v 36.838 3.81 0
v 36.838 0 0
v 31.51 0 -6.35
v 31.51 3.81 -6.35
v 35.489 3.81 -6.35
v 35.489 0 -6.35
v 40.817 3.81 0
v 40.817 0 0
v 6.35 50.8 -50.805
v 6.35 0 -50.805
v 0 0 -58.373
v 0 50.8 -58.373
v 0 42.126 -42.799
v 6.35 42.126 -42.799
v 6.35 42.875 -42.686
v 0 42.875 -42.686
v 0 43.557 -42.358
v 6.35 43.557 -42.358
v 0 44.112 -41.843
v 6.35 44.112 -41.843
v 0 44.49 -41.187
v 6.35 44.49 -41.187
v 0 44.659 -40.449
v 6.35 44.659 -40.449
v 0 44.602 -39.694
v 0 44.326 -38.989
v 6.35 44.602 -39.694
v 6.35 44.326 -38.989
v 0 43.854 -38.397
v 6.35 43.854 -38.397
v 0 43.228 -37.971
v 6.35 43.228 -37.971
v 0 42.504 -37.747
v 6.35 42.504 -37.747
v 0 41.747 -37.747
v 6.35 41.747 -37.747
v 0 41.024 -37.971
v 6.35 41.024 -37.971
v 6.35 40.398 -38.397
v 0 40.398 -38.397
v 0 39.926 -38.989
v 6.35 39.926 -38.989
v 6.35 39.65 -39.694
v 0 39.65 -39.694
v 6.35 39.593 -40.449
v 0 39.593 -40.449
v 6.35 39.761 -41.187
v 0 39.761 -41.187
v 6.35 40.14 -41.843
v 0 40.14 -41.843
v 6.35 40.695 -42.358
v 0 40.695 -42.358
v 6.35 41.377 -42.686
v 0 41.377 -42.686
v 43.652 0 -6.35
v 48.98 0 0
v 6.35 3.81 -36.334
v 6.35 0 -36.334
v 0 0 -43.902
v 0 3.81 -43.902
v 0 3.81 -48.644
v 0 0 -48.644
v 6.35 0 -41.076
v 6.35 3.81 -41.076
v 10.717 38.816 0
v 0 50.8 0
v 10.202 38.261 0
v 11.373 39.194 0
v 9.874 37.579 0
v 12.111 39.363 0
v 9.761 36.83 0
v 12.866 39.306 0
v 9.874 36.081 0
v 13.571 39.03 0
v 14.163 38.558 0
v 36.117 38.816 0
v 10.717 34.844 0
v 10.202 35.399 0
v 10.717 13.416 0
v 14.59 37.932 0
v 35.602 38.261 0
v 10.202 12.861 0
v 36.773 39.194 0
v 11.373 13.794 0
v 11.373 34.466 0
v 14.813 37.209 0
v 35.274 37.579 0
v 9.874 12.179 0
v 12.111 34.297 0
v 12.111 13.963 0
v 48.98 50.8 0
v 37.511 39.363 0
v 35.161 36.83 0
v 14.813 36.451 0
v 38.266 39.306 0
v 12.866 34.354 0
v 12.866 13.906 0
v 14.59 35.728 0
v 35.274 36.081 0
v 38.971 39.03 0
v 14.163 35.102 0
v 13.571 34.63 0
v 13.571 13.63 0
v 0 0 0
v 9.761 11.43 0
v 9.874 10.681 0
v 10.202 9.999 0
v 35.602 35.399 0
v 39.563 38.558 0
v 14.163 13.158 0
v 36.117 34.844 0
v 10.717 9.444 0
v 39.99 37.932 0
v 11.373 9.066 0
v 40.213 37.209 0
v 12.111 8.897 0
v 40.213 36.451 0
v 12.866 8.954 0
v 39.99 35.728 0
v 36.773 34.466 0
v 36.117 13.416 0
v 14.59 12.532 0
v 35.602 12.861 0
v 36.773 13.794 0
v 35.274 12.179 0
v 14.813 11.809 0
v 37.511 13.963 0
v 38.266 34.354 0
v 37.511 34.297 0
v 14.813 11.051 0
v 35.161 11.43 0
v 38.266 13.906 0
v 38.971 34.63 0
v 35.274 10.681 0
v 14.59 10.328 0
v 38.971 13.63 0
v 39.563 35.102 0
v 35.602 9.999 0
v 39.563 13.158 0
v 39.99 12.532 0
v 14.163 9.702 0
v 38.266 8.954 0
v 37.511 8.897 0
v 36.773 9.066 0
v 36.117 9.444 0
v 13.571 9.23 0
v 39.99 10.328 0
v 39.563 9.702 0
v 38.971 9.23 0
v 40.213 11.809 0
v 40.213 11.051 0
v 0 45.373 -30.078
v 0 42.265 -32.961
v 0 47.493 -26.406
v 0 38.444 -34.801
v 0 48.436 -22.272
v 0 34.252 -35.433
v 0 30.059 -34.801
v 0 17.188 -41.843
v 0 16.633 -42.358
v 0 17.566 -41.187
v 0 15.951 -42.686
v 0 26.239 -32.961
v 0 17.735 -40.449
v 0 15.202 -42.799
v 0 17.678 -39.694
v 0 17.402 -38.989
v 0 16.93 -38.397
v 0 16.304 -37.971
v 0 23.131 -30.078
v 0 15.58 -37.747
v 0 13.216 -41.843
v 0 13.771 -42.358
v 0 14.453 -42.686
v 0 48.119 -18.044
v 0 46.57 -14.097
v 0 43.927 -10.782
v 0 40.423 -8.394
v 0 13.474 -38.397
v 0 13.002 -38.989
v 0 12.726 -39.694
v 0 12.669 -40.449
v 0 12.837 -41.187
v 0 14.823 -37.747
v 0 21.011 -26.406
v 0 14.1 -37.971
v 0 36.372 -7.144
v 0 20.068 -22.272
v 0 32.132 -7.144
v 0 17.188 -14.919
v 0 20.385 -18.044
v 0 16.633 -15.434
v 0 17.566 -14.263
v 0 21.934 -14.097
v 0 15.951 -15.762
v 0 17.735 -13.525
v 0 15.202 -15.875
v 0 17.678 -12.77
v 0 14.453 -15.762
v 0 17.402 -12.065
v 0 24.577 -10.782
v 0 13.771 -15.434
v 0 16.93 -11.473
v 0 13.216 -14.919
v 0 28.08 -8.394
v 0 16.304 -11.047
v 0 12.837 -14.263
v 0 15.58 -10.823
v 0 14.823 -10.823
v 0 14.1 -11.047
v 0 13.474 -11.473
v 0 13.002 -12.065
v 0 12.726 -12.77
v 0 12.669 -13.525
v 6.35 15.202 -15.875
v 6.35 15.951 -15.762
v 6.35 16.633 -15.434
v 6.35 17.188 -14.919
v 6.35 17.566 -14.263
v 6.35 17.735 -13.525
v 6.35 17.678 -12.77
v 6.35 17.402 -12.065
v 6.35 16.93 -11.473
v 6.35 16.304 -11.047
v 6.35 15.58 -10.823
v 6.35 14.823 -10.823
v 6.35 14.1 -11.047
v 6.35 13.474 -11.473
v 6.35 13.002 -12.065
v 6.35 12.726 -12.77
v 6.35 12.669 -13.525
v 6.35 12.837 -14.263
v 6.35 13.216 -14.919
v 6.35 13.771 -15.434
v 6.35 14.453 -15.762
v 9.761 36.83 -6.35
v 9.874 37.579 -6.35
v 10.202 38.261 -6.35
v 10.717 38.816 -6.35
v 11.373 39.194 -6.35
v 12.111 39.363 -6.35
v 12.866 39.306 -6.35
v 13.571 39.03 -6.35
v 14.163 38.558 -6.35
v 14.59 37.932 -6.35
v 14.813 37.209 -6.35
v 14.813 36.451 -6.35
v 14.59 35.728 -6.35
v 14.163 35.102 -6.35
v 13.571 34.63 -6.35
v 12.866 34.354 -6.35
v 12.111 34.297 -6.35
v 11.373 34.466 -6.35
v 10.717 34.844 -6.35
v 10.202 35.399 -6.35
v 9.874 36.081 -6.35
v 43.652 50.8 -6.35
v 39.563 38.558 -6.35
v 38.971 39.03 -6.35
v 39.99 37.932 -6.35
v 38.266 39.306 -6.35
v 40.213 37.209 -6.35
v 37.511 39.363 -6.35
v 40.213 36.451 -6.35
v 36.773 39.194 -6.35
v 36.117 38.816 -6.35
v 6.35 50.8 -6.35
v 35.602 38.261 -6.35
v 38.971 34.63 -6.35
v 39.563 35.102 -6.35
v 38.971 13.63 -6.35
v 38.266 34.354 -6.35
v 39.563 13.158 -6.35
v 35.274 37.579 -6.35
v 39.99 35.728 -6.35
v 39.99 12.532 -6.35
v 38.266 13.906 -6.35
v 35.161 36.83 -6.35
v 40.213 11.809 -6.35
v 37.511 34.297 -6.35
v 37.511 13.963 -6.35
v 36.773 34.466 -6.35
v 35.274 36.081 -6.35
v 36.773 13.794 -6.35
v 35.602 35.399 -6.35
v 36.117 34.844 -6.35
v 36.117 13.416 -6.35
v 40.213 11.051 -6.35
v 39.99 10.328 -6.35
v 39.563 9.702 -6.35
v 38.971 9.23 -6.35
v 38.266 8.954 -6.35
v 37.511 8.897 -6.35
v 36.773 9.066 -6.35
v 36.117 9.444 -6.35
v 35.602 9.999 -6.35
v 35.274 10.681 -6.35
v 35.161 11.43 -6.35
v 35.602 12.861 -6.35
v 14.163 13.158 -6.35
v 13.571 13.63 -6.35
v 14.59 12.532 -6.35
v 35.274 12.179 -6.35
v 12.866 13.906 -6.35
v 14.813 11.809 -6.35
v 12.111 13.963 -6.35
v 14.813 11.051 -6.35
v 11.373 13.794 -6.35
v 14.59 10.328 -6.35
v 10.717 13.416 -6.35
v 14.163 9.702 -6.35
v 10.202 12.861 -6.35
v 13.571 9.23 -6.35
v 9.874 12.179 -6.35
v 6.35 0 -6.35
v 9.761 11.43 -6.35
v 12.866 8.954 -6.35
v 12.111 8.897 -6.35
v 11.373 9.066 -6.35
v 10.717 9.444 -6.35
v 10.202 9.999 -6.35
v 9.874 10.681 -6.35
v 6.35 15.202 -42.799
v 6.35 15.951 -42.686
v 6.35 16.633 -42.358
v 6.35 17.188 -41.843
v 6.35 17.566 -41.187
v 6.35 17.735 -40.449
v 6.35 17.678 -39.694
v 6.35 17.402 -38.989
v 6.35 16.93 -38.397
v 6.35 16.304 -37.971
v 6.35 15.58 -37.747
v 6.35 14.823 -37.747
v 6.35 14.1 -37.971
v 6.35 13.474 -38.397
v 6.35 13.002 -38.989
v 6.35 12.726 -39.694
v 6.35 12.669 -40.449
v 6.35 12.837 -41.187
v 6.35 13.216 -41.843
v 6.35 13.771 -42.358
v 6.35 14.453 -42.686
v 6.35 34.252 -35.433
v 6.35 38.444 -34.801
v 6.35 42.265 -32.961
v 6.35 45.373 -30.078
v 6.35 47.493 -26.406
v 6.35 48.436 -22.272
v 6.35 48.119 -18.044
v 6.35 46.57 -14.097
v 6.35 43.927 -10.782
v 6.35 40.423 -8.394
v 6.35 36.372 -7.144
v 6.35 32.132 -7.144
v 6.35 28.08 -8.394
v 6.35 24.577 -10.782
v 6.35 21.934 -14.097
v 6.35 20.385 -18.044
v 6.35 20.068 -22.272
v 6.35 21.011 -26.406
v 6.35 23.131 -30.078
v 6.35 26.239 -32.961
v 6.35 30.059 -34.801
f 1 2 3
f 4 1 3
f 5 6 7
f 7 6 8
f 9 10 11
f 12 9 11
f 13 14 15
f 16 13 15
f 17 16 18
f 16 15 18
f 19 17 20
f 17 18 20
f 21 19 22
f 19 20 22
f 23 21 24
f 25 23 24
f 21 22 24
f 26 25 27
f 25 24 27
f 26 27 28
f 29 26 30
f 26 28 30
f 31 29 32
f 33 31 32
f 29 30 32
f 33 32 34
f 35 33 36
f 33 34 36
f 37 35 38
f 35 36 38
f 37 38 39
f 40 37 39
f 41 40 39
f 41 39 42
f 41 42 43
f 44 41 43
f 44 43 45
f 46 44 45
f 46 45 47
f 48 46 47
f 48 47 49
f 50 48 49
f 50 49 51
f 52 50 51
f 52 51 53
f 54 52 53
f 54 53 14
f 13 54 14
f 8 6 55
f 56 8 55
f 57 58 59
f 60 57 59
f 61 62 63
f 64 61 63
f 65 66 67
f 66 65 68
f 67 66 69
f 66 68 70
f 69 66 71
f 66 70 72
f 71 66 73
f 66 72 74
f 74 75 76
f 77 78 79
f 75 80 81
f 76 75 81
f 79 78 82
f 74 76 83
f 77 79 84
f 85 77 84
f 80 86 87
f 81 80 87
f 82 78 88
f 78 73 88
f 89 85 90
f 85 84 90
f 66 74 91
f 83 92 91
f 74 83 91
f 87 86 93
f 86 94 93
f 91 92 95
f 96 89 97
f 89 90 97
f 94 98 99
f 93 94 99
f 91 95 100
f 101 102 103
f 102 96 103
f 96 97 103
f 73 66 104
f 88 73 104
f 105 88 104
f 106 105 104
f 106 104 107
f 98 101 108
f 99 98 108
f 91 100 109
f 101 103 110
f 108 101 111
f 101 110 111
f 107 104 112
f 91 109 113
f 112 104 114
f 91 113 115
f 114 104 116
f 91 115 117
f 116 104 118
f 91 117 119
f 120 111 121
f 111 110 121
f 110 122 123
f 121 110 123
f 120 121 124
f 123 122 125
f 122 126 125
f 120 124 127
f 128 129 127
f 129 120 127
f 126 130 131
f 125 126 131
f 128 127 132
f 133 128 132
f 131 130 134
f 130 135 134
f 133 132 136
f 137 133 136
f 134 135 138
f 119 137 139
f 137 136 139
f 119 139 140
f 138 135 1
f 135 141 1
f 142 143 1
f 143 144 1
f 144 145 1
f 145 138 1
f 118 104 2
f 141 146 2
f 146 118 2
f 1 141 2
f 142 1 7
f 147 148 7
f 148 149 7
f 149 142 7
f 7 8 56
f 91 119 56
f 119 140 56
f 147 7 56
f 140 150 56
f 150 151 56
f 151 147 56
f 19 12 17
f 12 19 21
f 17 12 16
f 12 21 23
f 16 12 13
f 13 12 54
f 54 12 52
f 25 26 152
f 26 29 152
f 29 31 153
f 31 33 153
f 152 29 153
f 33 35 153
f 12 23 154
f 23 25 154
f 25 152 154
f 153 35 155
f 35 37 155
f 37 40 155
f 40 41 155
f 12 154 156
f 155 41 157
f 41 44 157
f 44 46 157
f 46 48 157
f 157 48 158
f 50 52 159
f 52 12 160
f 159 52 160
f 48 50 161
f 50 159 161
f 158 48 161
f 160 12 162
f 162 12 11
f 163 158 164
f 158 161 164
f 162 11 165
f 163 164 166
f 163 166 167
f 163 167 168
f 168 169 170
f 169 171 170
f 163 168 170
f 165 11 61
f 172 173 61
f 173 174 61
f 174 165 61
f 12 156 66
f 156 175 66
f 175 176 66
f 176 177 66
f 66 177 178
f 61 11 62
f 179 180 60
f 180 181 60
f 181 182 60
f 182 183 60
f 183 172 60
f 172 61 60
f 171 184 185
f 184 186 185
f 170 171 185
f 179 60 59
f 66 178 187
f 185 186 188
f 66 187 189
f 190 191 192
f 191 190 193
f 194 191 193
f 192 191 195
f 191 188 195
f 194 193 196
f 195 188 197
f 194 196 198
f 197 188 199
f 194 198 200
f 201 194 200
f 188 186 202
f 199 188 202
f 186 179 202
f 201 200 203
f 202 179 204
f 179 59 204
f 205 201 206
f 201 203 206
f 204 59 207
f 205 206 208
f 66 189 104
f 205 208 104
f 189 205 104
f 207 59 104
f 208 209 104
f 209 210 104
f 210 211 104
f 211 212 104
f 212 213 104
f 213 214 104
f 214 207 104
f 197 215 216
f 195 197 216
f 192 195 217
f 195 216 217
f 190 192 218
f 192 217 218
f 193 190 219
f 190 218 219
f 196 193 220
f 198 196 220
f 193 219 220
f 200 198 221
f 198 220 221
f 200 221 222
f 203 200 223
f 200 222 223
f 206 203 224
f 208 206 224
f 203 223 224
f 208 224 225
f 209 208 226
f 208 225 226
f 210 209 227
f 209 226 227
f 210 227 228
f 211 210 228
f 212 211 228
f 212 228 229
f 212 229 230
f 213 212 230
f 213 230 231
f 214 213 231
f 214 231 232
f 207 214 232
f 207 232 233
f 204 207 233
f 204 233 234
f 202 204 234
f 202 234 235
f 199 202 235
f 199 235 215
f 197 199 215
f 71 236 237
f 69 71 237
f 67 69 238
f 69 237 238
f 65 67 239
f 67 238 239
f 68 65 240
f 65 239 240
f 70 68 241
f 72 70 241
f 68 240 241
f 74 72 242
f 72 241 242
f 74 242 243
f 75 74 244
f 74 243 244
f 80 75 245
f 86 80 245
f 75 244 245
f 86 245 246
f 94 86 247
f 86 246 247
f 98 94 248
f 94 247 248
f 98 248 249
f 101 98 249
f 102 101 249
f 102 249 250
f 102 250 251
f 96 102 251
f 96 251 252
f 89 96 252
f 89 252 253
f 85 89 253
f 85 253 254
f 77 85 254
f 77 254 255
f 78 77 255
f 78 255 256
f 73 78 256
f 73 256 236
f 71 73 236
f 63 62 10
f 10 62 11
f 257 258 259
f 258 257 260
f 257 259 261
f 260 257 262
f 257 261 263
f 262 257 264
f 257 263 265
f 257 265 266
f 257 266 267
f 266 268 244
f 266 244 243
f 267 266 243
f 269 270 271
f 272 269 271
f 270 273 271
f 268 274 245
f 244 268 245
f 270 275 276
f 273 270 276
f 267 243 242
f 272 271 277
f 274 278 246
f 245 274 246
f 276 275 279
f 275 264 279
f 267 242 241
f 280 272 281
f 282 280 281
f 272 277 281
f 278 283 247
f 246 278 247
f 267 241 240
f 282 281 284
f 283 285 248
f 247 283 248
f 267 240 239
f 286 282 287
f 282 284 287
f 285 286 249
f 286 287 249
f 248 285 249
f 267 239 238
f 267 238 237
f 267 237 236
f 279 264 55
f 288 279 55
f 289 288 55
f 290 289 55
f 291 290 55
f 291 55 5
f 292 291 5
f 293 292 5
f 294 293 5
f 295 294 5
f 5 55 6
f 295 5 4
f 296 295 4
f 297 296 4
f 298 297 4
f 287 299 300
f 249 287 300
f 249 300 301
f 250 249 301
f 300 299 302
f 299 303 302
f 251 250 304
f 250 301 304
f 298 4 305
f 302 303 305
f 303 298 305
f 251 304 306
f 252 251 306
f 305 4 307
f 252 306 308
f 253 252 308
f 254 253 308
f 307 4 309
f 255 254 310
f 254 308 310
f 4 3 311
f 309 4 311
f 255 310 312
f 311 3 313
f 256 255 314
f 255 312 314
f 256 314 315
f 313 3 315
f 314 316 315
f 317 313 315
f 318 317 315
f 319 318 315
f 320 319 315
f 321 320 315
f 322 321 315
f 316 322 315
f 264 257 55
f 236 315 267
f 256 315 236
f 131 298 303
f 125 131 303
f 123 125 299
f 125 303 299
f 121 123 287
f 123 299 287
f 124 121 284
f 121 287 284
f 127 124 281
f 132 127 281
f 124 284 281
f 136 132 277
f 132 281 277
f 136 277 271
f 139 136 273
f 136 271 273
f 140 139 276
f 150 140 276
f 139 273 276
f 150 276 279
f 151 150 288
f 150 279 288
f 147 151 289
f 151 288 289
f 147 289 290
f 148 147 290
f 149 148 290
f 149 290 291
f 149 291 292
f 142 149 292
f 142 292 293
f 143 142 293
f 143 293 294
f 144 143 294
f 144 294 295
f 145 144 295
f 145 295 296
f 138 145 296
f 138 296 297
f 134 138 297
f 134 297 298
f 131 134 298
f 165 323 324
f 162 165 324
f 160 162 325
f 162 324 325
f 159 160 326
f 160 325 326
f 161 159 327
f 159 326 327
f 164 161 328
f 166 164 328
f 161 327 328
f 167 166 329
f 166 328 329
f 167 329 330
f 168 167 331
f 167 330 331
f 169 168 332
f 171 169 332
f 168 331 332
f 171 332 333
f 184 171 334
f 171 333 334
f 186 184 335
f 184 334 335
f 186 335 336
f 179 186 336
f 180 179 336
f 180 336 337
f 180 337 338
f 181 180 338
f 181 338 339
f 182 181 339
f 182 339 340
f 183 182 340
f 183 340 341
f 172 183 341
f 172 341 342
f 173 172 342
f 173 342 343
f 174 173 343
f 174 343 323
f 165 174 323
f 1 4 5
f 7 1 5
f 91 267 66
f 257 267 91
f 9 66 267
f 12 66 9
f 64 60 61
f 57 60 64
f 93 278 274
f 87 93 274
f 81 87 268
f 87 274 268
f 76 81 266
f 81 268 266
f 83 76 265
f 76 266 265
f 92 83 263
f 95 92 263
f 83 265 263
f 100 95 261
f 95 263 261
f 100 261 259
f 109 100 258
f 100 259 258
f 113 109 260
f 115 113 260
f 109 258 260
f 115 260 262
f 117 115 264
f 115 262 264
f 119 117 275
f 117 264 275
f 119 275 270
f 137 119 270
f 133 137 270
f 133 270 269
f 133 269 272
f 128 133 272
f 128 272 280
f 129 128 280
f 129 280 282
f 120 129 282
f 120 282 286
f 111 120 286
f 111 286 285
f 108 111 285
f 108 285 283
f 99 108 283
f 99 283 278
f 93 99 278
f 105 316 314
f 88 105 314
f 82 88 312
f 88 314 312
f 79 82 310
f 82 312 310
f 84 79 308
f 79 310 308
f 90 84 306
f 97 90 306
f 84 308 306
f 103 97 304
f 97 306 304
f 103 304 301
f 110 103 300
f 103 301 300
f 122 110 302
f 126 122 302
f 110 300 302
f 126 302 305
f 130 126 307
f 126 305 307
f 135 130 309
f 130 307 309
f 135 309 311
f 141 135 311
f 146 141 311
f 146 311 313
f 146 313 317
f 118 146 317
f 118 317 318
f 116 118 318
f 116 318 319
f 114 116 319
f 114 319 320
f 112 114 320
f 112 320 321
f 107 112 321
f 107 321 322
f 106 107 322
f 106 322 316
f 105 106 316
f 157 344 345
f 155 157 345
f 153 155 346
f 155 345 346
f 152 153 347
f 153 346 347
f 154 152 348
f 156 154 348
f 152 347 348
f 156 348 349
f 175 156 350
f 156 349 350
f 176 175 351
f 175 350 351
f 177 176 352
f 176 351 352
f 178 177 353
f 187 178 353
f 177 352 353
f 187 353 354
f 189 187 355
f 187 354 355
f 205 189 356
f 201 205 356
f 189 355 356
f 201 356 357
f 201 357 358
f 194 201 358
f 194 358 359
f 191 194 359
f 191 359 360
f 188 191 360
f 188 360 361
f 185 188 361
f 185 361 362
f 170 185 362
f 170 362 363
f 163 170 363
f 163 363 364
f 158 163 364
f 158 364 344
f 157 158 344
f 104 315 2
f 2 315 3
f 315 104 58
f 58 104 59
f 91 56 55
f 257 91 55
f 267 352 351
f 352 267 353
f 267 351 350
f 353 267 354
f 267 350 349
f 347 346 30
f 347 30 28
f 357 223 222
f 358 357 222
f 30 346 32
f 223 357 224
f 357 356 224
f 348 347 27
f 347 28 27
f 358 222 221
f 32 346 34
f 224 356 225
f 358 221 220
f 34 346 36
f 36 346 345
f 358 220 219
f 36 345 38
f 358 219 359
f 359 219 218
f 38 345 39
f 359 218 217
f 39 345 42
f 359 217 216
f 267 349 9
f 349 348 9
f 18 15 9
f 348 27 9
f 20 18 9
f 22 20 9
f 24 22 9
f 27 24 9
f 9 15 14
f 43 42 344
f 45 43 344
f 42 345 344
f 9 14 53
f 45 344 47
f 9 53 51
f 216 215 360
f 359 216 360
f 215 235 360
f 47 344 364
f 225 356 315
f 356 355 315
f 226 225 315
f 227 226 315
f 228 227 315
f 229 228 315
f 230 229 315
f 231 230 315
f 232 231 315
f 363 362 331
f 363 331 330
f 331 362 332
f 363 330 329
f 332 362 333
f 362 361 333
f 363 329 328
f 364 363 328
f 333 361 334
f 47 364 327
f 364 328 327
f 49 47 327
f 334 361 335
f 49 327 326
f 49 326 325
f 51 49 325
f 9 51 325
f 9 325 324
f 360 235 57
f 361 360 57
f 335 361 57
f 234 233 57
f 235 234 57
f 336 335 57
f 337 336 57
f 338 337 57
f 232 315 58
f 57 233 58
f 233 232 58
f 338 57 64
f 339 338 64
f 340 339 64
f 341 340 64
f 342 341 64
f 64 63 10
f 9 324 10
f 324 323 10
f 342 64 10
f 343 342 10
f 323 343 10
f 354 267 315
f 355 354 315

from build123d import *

# Parameters (mm, degrees)
BOSS_EXTRUDE1_DEPTH = 50.8
CUT_EXTRUDE2_REACH  = 8.35
SKETCH4_R           = 2.54
CUT_EXTRUDE1_REACH  = 8.35
SKETCH3_R           = 2.54
SKETCH3_R_2         = 14.224
CUT_EXTRUDE3_DEPTH  = 3.81


with BuildPart() as part:
    # Sketch2 → Boss-Extrude1 (new body)
    with BuildSketch(Plane(origin=(0, 0, 0), x_dir=(1, 0, 0), z_dir=(0, 1, 0))):
        Polygon((0, 58.372586566), (0, 0), (48.980415858, 0), (43.6521332, 6.35), (6.35, 6.35), (6.35, 50.804951253), align=None)
    extrude(amount=BOSS_EXTRUDE1_DEPTH)

    # Sketch4 → Cut-Extrude2 (cut, up to next)
    with BuildSketch(Plane(origin=(0, 0, -6.35), x_dir=(-1, 0, 0), z_dir=(0, 0, -1)), mode=Mode.PRIVATE) as cut_extrude2_sk1:
        with Locations((-37.7010666, 36.83)):
            Circle(SKETCH4_R)
    cut_extrude2_tool1 = extrude(cut_extrude2_sk1.sketch, amount=-CUT_EXTRUDE2_REACH, mode=Mode.PRIVATE) & part.part
    add(cut_extrude2_tool1.solids().sort_by_distance((37.701067, 36.83, -6.35))[0], mode=Mode.SUBTRACT)
    # Sketch4 → Cut-Extrude2 (cut, up to next)
    with BuildSketch(Plane(origin=(0, 0, -6.35), x_dir=(-1, 0, 0), z_dir=(0, 0, -1)), mode=Mode.PRIVATE) as cut_extrude2_sk2:
        with Locations((-12.3010666, 36.83)):
            Circle(SKETCH4_R)
    cut_extrude2_tool2 = extrude(cut_extrude2_sk2.sketch, amount=-CUT_EXTRUDE2_REACH, mode=Mode.PRIVATE) & part.part
    add(cut_extrude2_tool2.solids().sort_by_distance((12.301067, 36.83, -6.35))[0], mode=Mode.SUBTRACT)
    # Sketch4 → Cut-Extrude2 (cut, up to next)
    with BuildSketch(Plane(origin=(0, 0, -6.35), x_dir=(-1, 0, 0), z_dir=(0, 0, -1)), mode=Mode.PRIVATE) as cut_extrude2_sk3:
        with Locations((-37.7010666, 11.43)):
            Circle(SKETCH4_R)
    cut_extrude2_tool3 = extrude(cut_extrude2_sk3.sketch, amount=-CUT_EXTRUDE2_REACH, mode=Mode.PRIVATE) & part.part
    add(cut_extrude2_tool3.solids().sort_by_distance((37.701067, 11.43, -6.35))[0], mode=Mode.SUBTRACT)
    # Sketch4 → Cut-Extrude2 (cut, up to next)
    with BuildSketch(Plane(origin=(0, 0, -6.35), x_dir=(-1, 0, 0), z_dir=(0, 0, -1)), mode=Mode.PRIVATE) as cut_extrude2_sk4:
        with Locations((-12.3010666, 11.43)):
            Circle(SKETCH4_R)
    cut_extrude2_tool4 = extrude(cut_extrude2_sk4.sketch, amount=-CUT_EXTRUDE2_REACH, mode=Mode.PRIVATE) & part.part
    add(cut_extrude2_tool4.solids().sort_by_distance((12.301067, 11.43, -6.35))[0], mode=Mode.SUBTRACT)

    # Sketch3 → Cut-Extrude1 (cut, up to next)
    with BuildSketch(Plane(origin=(6.35, 0, 0), x_dir=(0, 0, -1), z_dir=(1, 0, 0)), mode=Mode.PRIVATE) as cut_extrude1_sk1:
        with Locations((13.335, 15.2019)):
            Circle(SKETCH3_R)
    cut_extrude1_tool1 = extrude(cut_extrude1_sk1.sketch, amount=-CUT_EXTRUDE1_REACH, mode=Mode.PRIVATE) & part.part
    add(cut_extrude1_tool1.solids().sort_by_distance((6.35, 15.2019, -13.335))[0], mode=Mode.SUBTRACT)
    # Sketch3 → Cut-Extrude1 (cut, up to next)
    with BuildSketch(Plane(origin=(6.35, 0, 0), x_dir=(0, 0, -1), z_dir=(1, 0, 0)), mode=Mode.PRIVATE) as cut_extrude1_sk2:
        with Locations((21.209, 34.2519)):
            Circle(SKETCH3_R_2)
    cut_extrude1_tool2 = extrude(cut_extrude1_sk2.sketch, amount=-CUT_EXTRUDE1_REACH, mode=Mode.PRIVATE) & part.part
    add(cut_extrude1_tool2.solids().sort_by_distance((6.35, 34.2519, -21.209))[0], mode=Mode.SUBTRACT)
    # Sketch3 → Cut-Extrude1 (cut, up to next)
    with BuildSketch(Plane(origin=(6.35, 0, 0), x_dir=(0, 0, -1), z_dir=(1, 0, 0)), mode=Mode.PRIVATE) as cut_extrude1_sk3:
        with Locations((40.259, 15.2019)):
            Circle(SKETCH3_R)
    cut_extrude1_tool3 = extrude(cut_extrude1_sk3.sketch, amount=-CUT_EXTRUDE1_REACH, mode=Mode.PRIVATE) & part.part
    add(cut_extrude1_tool3.solids().sort_by_distance((6.35, 15.2019, -40.259))[0], mode=Mode.SUBTRACT)
    # Sketch3 → Cut-Extrude1 (cut, up to next)
    with BuildSketch(Plane(origin=(6.35, 0, 0), x_dir=(0, 0, -1), z_dir=(1, 0, 0)), mode=Mode.PRIVATE) as cut_extrude1_sk4:
        with Locations((40.259, 42.1259)):
            Circle(SKETCH3_R)
    cut_extrude1_tool4 = extrude(cut_extrude1_sk4.sketch, amount=-CUT_EXTRUDE1_REACH, mode=Mode.PRIVATE) & part.part
    add(cut_extrude1_tool4.solids().sort_by_distance((6.35, 42.1259, -40.259))[0], mode=Mode.SUBTRACT)

    # Sketch5 → Cut-Extrude3 (cut)
    with BuildSketch(Plane.XZ):
        Polygon((0, -48.643822138), (40.817013215, 0), (36.838131797, 0), (0, -43.901975914), align=None)
    extrude(amount=-CUT_EXTRUDE3_DEPTH, mode=Mode.SUBTRACT)


solid = part.part
